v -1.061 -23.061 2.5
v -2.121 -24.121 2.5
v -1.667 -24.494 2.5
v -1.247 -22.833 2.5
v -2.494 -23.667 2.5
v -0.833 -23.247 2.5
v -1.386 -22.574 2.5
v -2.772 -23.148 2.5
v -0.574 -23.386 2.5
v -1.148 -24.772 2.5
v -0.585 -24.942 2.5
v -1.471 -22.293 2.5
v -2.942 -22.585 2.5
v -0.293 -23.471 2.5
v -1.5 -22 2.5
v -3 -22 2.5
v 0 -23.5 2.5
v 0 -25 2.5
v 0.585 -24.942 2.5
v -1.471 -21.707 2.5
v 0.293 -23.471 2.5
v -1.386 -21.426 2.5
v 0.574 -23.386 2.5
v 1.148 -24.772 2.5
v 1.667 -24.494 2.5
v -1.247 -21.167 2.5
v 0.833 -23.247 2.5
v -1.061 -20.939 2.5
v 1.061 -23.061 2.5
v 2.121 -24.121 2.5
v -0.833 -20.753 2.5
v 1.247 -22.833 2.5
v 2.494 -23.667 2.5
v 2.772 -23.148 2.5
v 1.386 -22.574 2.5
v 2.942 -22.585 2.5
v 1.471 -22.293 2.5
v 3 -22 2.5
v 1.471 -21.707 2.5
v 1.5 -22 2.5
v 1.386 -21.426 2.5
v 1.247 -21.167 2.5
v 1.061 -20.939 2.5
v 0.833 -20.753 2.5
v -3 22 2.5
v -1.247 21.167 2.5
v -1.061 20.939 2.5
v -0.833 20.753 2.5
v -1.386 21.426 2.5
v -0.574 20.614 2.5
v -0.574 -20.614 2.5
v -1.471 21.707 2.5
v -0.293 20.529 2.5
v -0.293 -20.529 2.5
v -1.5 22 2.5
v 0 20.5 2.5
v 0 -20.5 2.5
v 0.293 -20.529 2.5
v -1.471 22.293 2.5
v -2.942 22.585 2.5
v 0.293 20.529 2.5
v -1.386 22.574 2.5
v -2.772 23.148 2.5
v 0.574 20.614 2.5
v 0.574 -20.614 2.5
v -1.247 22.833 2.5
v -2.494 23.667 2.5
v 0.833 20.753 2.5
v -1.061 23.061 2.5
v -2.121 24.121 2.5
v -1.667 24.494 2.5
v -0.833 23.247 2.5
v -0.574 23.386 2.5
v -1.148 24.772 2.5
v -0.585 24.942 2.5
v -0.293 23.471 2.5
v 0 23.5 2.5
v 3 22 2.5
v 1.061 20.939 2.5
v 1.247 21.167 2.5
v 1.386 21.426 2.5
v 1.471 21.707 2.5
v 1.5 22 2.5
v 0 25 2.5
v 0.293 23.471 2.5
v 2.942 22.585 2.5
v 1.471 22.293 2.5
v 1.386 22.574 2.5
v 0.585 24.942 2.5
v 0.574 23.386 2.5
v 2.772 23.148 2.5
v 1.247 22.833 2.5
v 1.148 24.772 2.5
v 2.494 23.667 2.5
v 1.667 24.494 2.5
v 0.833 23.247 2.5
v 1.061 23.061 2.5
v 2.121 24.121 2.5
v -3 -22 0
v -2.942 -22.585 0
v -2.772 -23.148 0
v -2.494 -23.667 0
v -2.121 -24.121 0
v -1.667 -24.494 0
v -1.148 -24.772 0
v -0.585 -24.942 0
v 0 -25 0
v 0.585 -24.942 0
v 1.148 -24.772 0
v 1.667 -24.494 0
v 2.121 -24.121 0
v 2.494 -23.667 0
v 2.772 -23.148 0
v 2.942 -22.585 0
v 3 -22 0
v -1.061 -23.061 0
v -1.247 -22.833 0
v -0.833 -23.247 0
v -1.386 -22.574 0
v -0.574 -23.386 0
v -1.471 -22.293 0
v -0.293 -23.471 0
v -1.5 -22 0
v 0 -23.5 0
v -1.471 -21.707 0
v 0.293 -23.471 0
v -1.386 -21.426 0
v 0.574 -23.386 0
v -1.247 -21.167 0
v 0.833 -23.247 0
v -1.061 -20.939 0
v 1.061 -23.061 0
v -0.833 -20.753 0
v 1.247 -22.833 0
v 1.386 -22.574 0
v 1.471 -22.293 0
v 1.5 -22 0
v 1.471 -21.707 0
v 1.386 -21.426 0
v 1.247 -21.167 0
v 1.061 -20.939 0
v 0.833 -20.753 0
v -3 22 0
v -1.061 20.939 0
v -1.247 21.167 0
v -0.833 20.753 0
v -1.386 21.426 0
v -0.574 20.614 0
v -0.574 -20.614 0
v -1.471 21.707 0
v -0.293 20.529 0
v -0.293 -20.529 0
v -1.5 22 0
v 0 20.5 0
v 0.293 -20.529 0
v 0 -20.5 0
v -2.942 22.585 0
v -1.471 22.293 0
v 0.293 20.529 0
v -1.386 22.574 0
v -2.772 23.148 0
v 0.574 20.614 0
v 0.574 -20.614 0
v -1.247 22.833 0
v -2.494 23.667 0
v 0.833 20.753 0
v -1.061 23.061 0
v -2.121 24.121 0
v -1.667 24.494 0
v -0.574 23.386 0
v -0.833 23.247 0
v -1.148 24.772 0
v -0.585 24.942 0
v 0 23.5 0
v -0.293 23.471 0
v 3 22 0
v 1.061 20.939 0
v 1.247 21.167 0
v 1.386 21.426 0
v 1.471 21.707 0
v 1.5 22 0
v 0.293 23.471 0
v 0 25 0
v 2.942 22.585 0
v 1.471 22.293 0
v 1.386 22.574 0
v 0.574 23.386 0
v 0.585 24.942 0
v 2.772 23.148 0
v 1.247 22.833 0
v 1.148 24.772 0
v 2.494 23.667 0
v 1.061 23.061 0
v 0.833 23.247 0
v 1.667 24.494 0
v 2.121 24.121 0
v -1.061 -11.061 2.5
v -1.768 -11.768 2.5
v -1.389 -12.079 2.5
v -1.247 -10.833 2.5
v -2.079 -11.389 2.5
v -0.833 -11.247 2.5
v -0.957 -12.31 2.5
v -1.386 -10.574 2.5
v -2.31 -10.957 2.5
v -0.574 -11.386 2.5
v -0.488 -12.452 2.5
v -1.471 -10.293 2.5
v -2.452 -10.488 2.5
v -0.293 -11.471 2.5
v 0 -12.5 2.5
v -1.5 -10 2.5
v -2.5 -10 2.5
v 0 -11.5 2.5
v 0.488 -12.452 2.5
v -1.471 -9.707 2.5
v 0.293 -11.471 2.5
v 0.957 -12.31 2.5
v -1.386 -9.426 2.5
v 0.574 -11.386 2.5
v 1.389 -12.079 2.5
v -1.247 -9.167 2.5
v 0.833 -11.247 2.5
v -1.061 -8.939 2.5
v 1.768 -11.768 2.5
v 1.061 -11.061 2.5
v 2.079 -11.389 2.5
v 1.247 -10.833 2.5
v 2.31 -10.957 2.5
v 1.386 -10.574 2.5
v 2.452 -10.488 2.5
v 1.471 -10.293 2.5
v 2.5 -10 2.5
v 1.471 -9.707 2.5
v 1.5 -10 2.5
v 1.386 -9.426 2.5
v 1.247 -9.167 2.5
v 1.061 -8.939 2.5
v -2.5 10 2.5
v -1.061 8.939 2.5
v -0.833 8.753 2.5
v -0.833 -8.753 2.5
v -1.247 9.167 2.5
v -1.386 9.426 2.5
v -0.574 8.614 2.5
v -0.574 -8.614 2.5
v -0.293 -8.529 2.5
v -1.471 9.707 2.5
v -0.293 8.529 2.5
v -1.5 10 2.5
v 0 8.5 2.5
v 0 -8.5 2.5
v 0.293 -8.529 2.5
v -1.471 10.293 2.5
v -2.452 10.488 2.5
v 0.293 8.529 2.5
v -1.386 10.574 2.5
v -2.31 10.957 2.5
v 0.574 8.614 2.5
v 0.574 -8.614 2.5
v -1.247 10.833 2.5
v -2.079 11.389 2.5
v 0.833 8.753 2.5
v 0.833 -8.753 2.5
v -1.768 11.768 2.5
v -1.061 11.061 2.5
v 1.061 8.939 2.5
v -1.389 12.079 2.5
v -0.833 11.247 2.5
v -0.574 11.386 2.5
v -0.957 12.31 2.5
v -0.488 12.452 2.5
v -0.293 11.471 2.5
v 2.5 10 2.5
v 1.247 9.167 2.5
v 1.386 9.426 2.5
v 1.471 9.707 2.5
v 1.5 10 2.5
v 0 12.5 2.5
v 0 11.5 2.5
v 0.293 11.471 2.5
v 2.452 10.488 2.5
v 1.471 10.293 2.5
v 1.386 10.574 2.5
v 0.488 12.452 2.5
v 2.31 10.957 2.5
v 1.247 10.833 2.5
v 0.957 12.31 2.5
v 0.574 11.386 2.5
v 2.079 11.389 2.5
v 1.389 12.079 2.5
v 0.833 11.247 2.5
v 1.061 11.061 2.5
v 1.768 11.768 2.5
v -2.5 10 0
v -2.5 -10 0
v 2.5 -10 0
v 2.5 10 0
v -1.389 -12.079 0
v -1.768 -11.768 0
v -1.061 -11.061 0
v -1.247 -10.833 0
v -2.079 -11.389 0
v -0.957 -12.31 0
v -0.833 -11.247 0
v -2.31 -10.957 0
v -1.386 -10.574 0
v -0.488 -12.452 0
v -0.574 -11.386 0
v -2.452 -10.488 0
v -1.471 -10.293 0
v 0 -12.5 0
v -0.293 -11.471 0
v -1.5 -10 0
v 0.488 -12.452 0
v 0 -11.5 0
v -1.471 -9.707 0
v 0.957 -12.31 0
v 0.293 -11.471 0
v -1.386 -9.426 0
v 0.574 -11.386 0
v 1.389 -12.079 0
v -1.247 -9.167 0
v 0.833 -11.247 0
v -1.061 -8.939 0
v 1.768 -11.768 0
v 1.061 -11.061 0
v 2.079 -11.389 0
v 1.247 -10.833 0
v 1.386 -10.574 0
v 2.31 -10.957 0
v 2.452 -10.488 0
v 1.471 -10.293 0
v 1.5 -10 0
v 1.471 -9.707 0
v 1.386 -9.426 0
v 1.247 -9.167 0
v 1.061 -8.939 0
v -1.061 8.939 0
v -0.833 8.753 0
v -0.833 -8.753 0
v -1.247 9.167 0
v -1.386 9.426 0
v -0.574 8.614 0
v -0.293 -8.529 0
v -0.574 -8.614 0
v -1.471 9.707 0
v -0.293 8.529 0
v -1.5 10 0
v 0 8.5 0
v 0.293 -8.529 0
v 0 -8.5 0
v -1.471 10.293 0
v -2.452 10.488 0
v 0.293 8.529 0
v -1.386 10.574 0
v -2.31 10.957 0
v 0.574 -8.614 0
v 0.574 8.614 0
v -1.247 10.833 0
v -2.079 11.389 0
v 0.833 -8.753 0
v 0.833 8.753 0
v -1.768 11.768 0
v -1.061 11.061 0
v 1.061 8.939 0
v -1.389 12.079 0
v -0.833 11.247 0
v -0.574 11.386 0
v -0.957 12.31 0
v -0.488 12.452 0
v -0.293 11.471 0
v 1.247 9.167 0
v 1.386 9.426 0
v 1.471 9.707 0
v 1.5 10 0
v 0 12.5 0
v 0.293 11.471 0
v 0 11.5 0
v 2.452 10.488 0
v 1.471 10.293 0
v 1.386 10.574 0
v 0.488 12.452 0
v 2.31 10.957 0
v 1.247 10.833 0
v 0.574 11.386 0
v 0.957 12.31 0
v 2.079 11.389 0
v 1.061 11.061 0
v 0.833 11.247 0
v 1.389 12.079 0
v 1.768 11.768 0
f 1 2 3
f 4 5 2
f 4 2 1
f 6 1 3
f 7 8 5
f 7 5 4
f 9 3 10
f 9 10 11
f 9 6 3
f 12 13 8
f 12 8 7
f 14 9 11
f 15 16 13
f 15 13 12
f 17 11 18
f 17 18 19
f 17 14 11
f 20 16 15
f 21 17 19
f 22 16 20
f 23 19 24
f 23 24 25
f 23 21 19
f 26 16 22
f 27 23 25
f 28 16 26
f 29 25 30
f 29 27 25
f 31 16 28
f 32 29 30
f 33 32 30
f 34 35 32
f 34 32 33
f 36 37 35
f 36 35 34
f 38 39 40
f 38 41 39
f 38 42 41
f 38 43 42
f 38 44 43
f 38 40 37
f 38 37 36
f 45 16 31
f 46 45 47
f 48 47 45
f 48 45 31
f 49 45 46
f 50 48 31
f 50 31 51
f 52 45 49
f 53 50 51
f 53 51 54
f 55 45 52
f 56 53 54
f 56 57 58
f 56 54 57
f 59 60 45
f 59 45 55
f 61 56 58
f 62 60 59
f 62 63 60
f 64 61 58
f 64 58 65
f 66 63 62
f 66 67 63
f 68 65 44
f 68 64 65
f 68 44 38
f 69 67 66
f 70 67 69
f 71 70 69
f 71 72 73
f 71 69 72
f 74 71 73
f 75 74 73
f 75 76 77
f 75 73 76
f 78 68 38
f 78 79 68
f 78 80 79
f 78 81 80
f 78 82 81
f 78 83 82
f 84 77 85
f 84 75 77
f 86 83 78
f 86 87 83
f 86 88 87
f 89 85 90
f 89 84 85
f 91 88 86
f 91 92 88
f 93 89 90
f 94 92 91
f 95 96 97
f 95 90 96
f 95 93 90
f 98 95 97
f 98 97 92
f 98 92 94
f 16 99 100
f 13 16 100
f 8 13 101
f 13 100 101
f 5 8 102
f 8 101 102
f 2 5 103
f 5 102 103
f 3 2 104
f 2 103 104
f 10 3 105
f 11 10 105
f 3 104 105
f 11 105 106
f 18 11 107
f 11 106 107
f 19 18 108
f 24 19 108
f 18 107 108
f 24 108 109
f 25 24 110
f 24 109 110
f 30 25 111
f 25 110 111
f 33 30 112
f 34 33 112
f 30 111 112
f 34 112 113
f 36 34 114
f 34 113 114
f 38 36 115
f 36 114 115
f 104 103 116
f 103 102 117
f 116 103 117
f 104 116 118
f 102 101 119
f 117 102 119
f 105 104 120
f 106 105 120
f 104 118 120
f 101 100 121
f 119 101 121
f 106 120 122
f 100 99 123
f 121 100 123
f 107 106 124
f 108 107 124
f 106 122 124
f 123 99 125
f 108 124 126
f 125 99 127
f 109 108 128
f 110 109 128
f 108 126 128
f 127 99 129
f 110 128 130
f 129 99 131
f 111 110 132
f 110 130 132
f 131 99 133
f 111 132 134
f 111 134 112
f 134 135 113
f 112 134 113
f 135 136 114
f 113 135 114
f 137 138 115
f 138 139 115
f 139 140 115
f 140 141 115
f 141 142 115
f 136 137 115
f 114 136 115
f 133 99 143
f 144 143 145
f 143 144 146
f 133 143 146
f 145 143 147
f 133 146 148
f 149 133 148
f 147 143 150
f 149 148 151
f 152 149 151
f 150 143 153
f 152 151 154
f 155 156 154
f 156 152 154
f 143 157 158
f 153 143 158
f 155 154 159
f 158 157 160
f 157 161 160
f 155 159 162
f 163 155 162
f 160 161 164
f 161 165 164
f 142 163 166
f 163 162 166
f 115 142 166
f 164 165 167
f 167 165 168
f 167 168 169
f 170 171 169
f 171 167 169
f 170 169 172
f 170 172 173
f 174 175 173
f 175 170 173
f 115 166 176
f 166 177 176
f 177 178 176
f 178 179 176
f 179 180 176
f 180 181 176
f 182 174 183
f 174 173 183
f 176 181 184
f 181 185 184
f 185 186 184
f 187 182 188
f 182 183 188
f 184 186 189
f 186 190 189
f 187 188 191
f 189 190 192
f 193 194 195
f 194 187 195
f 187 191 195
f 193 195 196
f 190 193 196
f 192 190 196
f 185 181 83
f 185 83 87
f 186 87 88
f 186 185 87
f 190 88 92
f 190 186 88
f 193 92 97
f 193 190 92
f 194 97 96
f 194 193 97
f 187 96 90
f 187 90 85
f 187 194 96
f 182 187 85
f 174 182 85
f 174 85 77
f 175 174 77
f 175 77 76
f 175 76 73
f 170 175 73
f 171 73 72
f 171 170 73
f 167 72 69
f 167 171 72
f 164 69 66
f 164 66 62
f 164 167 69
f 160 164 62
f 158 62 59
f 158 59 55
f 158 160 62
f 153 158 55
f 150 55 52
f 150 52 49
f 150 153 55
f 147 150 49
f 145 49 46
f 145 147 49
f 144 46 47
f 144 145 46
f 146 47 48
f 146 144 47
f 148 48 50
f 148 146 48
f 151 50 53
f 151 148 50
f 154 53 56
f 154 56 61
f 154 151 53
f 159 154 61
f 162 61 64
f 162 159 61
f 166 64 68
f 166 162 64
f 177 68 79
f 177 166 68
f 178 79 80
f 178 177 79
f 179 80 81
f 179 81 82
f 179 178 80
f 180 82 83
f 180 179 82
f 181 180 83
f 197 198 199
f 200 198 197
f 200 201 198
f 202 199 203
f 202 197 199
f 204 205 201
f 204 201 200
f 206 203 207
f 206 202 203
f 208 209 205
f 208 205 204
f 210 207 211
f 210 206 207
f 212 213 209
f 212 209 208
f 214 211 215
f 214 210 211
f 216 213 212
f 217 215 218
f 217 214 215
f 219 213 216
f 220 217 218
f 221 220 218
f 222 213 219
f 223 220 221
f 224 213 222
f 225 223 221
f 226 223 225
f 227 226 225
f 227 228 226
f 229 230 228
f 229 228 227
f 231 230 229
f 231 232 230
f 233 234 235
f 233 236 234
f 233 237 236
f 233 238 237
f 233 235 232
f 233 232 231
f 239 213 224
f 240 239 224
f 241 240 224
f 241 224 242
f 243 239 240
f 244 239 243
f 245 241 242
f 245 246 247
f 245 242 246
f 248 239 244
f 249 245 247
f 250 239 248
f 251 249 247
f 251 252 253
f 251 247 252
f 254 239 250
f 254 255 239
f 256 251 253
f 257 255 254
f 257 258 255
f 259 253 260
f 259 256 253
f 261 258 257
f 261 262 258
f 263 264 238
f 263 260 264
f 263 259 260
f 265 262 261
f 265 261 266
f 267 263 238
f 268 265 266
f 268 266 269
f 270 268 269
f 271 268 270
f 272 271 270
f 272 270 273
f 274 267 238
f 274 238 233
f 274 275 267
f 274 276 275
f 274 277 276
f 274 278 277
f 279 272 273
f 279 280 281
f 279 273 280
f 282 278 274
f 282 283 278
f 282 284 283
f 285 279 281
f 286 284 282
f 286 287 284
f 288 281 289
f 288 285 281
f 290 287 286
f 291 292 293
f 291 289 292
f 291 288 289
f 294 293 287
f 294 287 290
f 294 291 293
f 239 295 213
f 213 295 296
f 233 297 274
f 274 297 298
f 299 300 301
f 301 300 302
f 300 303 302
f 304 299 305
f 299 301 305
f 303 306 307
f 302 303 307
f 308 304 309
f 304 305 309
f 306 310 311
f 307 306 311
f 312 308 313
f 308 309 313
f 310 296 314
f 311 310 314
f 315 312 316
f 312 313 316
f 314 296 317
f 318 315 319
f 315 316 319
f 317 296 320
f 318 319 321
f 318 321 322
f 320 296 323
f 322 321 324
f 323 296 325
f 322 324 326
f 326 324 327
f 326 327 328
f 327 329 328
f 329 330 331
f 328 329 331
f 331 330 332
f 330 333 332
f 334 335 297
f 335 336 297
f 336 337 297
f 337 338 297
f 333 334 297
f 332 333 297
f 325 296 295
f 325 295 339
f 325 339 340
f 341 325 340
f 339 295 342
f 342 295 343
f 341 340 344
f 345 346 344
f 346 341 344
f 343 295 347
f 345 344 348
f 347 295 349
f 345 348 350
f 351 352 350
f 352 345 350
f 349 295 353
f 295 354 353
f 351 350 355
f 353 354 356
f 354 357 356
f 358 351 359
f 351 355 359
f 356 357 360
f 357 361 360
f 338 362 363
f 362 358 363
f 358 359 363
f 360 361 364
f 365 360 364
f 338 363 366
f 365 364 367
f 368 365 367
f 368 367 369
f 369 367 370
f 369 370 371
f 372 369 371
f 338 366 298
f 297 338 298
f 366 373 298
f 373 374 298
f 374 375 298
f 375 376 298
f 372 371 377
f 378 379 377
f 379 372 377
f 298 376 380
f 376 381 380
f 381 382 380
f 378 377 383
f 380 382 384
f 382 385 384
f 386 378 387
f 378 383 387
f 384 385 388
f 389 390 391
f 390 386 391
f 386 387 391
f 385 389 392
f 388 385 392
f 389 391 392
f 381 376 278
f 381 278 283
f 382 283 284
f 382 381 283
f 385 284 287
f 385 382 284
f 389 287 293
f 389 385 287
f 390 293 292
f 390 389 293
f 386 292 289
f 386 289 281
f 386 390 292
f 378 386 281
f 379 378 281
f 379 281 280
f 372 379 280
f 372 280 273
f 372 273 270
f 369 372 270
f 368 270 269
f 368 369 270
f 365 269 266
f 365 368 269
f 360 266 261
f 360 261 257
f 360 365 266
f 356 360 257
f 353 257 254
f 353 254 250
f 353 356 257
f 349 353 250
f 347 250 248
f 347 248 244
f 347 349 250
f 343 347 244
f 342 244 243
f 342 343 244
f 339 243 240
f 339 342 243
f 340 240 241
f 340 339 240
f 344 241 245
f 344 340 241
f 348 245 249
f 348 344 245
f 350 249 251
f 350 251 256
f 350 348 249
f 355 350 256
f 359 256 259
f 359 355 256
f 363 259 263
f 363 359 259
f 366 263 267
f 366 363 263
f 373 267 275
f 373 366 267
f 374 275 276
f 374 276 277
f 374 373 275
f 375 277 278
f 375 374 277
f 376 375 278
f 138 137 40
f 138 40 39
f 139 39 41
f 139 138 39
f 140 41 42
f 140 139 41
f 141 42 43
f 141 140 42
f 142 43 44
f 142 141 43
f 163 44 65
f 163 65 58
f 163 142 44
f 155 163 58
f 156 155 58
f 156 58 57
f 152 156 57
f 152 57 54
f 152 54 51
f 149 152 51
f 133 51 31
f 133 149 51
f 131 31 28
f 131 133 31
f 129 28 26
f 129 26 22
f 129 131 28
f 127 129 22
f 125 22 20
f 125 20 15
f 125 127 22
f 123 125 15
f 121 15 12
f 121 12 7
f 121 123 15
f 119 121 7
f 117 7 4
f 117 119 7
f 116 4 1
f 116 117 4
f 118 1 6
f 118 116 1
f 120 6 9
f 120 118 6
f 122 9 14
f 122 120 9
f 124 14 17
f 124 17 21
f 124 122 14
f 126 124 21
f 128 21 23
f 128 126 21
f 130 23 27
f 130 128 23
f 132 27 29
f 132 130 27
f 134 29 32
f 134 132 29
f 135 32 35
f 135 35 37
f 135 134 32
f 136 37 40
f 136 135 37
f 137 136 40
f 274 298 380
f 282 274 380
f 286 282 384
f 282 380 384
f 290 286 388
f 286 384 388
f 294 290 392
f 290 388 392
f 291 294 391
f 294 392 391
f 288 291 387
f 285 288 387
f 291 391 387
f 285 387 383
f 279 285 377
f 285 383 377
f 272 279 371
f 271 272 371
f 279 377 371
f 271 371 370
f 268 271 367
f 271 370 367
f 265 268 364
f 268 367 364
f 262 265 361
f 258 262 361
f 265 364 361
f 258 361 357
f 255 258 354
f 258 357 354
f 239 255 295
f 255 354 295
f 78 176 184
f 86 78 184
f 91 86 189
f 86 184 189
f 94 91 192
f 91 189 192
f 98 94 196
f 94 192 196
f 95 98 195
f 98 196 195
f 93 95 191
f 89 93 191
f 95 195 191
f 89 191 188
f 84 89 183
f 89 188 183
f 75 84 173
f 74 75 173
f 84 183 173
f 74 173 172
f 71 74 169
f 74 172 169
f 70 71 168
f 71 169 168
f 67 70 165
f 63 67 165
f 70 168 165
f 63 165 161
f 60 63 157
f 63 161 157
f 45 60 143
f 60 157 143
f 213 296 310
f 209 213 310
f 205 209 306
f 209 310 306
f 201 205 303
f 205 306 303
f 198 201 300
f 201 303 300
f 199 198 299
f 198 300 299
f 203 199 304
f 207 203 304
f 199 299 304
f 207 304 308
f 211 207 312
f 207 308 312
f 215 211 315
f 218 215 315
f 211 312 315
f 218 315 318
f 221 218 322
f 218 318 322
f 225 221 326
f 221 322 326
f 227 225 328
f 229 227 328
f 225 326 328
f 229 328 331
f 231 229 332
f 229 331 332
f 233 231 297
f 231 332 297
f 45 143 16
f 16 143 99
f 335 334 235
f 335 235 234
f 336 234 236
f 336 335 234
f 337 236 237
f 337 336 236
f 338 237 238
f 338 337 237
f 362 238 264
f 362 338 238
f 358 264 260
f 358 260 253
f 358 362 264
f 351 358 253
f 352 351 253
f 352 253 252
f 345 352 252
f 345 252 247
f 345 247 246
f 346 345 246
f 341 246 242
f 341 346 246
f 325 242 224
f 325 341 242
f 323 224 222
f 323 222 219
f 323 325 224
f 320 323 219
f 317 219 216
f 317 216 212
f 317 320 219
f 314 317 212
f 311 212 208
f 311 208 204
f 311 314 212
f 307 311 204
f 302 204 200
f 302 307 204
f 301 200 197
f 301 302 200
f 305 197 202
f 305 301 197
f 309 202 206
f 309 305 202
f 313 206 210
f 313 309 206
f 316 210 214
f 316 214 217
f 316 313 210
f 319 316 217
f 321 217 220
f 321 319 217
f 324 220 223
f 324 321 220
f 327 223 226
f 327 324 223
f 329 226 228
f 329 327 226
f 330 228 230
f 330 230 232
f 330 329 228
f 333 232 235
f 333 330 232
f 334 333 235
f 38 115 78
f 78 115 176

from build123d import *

# Parameters (mm, degrees)
SKETCH_R     = 1.5
PAD_DEPTH    = 2.5
SKETCH001_R  = 1.5
PAD001_DEPTH = 2.5


with BuildPart() as f_44x6:
    # Sketch → Pad (new body)
    with BuildSketch(Plane.XY):
        with BuildLine():
            Line((-3, 22), (-3, -22))
            ThreePointArc((-3, -22), (0, -25), (3, -22))
            Line((3, -22), (3, 22))
            ThreePointArc((3, 22), (0, 25), (-3, 22))
        make_face()
        with Locations((0, 22)):
            Circle(SKETCH_R, mode=Mode.SUBTRACT)
        with Locations((0, -22)):
            Circle(SKETCH_R, mode=Mode.SUBTRACT)
    extrude(amount=PAD_DEPTH)


with BuildPart() as f_20x5:
    # Sketch001 → Pad001 (new body)
    with BuildSketch(Plane.XY):
        with BuildLine():
            Line((-2.5, 10), (-2.5, -10))
            ThreePointArc((-2.5, -10), (0, -12.5), (2.5, -10))
            Line((2.5, -10), (2.5, 10))
            ThreePointArc((2.5, 10), (0, 12.5), (-2.5, 10))
        make_face()
        with Locations((0, 10)):
            Circle(SKETCH001_R, mode=Mode.SUBTRACT)
        with Locations((0, -10)):
            Circle(SKETCH001_R, mode=Mode.SUBTRACT)
    extrude(amount=PAD001_DEPTH)


solid = Compound([f_44x6.part, f_20x5.part])
